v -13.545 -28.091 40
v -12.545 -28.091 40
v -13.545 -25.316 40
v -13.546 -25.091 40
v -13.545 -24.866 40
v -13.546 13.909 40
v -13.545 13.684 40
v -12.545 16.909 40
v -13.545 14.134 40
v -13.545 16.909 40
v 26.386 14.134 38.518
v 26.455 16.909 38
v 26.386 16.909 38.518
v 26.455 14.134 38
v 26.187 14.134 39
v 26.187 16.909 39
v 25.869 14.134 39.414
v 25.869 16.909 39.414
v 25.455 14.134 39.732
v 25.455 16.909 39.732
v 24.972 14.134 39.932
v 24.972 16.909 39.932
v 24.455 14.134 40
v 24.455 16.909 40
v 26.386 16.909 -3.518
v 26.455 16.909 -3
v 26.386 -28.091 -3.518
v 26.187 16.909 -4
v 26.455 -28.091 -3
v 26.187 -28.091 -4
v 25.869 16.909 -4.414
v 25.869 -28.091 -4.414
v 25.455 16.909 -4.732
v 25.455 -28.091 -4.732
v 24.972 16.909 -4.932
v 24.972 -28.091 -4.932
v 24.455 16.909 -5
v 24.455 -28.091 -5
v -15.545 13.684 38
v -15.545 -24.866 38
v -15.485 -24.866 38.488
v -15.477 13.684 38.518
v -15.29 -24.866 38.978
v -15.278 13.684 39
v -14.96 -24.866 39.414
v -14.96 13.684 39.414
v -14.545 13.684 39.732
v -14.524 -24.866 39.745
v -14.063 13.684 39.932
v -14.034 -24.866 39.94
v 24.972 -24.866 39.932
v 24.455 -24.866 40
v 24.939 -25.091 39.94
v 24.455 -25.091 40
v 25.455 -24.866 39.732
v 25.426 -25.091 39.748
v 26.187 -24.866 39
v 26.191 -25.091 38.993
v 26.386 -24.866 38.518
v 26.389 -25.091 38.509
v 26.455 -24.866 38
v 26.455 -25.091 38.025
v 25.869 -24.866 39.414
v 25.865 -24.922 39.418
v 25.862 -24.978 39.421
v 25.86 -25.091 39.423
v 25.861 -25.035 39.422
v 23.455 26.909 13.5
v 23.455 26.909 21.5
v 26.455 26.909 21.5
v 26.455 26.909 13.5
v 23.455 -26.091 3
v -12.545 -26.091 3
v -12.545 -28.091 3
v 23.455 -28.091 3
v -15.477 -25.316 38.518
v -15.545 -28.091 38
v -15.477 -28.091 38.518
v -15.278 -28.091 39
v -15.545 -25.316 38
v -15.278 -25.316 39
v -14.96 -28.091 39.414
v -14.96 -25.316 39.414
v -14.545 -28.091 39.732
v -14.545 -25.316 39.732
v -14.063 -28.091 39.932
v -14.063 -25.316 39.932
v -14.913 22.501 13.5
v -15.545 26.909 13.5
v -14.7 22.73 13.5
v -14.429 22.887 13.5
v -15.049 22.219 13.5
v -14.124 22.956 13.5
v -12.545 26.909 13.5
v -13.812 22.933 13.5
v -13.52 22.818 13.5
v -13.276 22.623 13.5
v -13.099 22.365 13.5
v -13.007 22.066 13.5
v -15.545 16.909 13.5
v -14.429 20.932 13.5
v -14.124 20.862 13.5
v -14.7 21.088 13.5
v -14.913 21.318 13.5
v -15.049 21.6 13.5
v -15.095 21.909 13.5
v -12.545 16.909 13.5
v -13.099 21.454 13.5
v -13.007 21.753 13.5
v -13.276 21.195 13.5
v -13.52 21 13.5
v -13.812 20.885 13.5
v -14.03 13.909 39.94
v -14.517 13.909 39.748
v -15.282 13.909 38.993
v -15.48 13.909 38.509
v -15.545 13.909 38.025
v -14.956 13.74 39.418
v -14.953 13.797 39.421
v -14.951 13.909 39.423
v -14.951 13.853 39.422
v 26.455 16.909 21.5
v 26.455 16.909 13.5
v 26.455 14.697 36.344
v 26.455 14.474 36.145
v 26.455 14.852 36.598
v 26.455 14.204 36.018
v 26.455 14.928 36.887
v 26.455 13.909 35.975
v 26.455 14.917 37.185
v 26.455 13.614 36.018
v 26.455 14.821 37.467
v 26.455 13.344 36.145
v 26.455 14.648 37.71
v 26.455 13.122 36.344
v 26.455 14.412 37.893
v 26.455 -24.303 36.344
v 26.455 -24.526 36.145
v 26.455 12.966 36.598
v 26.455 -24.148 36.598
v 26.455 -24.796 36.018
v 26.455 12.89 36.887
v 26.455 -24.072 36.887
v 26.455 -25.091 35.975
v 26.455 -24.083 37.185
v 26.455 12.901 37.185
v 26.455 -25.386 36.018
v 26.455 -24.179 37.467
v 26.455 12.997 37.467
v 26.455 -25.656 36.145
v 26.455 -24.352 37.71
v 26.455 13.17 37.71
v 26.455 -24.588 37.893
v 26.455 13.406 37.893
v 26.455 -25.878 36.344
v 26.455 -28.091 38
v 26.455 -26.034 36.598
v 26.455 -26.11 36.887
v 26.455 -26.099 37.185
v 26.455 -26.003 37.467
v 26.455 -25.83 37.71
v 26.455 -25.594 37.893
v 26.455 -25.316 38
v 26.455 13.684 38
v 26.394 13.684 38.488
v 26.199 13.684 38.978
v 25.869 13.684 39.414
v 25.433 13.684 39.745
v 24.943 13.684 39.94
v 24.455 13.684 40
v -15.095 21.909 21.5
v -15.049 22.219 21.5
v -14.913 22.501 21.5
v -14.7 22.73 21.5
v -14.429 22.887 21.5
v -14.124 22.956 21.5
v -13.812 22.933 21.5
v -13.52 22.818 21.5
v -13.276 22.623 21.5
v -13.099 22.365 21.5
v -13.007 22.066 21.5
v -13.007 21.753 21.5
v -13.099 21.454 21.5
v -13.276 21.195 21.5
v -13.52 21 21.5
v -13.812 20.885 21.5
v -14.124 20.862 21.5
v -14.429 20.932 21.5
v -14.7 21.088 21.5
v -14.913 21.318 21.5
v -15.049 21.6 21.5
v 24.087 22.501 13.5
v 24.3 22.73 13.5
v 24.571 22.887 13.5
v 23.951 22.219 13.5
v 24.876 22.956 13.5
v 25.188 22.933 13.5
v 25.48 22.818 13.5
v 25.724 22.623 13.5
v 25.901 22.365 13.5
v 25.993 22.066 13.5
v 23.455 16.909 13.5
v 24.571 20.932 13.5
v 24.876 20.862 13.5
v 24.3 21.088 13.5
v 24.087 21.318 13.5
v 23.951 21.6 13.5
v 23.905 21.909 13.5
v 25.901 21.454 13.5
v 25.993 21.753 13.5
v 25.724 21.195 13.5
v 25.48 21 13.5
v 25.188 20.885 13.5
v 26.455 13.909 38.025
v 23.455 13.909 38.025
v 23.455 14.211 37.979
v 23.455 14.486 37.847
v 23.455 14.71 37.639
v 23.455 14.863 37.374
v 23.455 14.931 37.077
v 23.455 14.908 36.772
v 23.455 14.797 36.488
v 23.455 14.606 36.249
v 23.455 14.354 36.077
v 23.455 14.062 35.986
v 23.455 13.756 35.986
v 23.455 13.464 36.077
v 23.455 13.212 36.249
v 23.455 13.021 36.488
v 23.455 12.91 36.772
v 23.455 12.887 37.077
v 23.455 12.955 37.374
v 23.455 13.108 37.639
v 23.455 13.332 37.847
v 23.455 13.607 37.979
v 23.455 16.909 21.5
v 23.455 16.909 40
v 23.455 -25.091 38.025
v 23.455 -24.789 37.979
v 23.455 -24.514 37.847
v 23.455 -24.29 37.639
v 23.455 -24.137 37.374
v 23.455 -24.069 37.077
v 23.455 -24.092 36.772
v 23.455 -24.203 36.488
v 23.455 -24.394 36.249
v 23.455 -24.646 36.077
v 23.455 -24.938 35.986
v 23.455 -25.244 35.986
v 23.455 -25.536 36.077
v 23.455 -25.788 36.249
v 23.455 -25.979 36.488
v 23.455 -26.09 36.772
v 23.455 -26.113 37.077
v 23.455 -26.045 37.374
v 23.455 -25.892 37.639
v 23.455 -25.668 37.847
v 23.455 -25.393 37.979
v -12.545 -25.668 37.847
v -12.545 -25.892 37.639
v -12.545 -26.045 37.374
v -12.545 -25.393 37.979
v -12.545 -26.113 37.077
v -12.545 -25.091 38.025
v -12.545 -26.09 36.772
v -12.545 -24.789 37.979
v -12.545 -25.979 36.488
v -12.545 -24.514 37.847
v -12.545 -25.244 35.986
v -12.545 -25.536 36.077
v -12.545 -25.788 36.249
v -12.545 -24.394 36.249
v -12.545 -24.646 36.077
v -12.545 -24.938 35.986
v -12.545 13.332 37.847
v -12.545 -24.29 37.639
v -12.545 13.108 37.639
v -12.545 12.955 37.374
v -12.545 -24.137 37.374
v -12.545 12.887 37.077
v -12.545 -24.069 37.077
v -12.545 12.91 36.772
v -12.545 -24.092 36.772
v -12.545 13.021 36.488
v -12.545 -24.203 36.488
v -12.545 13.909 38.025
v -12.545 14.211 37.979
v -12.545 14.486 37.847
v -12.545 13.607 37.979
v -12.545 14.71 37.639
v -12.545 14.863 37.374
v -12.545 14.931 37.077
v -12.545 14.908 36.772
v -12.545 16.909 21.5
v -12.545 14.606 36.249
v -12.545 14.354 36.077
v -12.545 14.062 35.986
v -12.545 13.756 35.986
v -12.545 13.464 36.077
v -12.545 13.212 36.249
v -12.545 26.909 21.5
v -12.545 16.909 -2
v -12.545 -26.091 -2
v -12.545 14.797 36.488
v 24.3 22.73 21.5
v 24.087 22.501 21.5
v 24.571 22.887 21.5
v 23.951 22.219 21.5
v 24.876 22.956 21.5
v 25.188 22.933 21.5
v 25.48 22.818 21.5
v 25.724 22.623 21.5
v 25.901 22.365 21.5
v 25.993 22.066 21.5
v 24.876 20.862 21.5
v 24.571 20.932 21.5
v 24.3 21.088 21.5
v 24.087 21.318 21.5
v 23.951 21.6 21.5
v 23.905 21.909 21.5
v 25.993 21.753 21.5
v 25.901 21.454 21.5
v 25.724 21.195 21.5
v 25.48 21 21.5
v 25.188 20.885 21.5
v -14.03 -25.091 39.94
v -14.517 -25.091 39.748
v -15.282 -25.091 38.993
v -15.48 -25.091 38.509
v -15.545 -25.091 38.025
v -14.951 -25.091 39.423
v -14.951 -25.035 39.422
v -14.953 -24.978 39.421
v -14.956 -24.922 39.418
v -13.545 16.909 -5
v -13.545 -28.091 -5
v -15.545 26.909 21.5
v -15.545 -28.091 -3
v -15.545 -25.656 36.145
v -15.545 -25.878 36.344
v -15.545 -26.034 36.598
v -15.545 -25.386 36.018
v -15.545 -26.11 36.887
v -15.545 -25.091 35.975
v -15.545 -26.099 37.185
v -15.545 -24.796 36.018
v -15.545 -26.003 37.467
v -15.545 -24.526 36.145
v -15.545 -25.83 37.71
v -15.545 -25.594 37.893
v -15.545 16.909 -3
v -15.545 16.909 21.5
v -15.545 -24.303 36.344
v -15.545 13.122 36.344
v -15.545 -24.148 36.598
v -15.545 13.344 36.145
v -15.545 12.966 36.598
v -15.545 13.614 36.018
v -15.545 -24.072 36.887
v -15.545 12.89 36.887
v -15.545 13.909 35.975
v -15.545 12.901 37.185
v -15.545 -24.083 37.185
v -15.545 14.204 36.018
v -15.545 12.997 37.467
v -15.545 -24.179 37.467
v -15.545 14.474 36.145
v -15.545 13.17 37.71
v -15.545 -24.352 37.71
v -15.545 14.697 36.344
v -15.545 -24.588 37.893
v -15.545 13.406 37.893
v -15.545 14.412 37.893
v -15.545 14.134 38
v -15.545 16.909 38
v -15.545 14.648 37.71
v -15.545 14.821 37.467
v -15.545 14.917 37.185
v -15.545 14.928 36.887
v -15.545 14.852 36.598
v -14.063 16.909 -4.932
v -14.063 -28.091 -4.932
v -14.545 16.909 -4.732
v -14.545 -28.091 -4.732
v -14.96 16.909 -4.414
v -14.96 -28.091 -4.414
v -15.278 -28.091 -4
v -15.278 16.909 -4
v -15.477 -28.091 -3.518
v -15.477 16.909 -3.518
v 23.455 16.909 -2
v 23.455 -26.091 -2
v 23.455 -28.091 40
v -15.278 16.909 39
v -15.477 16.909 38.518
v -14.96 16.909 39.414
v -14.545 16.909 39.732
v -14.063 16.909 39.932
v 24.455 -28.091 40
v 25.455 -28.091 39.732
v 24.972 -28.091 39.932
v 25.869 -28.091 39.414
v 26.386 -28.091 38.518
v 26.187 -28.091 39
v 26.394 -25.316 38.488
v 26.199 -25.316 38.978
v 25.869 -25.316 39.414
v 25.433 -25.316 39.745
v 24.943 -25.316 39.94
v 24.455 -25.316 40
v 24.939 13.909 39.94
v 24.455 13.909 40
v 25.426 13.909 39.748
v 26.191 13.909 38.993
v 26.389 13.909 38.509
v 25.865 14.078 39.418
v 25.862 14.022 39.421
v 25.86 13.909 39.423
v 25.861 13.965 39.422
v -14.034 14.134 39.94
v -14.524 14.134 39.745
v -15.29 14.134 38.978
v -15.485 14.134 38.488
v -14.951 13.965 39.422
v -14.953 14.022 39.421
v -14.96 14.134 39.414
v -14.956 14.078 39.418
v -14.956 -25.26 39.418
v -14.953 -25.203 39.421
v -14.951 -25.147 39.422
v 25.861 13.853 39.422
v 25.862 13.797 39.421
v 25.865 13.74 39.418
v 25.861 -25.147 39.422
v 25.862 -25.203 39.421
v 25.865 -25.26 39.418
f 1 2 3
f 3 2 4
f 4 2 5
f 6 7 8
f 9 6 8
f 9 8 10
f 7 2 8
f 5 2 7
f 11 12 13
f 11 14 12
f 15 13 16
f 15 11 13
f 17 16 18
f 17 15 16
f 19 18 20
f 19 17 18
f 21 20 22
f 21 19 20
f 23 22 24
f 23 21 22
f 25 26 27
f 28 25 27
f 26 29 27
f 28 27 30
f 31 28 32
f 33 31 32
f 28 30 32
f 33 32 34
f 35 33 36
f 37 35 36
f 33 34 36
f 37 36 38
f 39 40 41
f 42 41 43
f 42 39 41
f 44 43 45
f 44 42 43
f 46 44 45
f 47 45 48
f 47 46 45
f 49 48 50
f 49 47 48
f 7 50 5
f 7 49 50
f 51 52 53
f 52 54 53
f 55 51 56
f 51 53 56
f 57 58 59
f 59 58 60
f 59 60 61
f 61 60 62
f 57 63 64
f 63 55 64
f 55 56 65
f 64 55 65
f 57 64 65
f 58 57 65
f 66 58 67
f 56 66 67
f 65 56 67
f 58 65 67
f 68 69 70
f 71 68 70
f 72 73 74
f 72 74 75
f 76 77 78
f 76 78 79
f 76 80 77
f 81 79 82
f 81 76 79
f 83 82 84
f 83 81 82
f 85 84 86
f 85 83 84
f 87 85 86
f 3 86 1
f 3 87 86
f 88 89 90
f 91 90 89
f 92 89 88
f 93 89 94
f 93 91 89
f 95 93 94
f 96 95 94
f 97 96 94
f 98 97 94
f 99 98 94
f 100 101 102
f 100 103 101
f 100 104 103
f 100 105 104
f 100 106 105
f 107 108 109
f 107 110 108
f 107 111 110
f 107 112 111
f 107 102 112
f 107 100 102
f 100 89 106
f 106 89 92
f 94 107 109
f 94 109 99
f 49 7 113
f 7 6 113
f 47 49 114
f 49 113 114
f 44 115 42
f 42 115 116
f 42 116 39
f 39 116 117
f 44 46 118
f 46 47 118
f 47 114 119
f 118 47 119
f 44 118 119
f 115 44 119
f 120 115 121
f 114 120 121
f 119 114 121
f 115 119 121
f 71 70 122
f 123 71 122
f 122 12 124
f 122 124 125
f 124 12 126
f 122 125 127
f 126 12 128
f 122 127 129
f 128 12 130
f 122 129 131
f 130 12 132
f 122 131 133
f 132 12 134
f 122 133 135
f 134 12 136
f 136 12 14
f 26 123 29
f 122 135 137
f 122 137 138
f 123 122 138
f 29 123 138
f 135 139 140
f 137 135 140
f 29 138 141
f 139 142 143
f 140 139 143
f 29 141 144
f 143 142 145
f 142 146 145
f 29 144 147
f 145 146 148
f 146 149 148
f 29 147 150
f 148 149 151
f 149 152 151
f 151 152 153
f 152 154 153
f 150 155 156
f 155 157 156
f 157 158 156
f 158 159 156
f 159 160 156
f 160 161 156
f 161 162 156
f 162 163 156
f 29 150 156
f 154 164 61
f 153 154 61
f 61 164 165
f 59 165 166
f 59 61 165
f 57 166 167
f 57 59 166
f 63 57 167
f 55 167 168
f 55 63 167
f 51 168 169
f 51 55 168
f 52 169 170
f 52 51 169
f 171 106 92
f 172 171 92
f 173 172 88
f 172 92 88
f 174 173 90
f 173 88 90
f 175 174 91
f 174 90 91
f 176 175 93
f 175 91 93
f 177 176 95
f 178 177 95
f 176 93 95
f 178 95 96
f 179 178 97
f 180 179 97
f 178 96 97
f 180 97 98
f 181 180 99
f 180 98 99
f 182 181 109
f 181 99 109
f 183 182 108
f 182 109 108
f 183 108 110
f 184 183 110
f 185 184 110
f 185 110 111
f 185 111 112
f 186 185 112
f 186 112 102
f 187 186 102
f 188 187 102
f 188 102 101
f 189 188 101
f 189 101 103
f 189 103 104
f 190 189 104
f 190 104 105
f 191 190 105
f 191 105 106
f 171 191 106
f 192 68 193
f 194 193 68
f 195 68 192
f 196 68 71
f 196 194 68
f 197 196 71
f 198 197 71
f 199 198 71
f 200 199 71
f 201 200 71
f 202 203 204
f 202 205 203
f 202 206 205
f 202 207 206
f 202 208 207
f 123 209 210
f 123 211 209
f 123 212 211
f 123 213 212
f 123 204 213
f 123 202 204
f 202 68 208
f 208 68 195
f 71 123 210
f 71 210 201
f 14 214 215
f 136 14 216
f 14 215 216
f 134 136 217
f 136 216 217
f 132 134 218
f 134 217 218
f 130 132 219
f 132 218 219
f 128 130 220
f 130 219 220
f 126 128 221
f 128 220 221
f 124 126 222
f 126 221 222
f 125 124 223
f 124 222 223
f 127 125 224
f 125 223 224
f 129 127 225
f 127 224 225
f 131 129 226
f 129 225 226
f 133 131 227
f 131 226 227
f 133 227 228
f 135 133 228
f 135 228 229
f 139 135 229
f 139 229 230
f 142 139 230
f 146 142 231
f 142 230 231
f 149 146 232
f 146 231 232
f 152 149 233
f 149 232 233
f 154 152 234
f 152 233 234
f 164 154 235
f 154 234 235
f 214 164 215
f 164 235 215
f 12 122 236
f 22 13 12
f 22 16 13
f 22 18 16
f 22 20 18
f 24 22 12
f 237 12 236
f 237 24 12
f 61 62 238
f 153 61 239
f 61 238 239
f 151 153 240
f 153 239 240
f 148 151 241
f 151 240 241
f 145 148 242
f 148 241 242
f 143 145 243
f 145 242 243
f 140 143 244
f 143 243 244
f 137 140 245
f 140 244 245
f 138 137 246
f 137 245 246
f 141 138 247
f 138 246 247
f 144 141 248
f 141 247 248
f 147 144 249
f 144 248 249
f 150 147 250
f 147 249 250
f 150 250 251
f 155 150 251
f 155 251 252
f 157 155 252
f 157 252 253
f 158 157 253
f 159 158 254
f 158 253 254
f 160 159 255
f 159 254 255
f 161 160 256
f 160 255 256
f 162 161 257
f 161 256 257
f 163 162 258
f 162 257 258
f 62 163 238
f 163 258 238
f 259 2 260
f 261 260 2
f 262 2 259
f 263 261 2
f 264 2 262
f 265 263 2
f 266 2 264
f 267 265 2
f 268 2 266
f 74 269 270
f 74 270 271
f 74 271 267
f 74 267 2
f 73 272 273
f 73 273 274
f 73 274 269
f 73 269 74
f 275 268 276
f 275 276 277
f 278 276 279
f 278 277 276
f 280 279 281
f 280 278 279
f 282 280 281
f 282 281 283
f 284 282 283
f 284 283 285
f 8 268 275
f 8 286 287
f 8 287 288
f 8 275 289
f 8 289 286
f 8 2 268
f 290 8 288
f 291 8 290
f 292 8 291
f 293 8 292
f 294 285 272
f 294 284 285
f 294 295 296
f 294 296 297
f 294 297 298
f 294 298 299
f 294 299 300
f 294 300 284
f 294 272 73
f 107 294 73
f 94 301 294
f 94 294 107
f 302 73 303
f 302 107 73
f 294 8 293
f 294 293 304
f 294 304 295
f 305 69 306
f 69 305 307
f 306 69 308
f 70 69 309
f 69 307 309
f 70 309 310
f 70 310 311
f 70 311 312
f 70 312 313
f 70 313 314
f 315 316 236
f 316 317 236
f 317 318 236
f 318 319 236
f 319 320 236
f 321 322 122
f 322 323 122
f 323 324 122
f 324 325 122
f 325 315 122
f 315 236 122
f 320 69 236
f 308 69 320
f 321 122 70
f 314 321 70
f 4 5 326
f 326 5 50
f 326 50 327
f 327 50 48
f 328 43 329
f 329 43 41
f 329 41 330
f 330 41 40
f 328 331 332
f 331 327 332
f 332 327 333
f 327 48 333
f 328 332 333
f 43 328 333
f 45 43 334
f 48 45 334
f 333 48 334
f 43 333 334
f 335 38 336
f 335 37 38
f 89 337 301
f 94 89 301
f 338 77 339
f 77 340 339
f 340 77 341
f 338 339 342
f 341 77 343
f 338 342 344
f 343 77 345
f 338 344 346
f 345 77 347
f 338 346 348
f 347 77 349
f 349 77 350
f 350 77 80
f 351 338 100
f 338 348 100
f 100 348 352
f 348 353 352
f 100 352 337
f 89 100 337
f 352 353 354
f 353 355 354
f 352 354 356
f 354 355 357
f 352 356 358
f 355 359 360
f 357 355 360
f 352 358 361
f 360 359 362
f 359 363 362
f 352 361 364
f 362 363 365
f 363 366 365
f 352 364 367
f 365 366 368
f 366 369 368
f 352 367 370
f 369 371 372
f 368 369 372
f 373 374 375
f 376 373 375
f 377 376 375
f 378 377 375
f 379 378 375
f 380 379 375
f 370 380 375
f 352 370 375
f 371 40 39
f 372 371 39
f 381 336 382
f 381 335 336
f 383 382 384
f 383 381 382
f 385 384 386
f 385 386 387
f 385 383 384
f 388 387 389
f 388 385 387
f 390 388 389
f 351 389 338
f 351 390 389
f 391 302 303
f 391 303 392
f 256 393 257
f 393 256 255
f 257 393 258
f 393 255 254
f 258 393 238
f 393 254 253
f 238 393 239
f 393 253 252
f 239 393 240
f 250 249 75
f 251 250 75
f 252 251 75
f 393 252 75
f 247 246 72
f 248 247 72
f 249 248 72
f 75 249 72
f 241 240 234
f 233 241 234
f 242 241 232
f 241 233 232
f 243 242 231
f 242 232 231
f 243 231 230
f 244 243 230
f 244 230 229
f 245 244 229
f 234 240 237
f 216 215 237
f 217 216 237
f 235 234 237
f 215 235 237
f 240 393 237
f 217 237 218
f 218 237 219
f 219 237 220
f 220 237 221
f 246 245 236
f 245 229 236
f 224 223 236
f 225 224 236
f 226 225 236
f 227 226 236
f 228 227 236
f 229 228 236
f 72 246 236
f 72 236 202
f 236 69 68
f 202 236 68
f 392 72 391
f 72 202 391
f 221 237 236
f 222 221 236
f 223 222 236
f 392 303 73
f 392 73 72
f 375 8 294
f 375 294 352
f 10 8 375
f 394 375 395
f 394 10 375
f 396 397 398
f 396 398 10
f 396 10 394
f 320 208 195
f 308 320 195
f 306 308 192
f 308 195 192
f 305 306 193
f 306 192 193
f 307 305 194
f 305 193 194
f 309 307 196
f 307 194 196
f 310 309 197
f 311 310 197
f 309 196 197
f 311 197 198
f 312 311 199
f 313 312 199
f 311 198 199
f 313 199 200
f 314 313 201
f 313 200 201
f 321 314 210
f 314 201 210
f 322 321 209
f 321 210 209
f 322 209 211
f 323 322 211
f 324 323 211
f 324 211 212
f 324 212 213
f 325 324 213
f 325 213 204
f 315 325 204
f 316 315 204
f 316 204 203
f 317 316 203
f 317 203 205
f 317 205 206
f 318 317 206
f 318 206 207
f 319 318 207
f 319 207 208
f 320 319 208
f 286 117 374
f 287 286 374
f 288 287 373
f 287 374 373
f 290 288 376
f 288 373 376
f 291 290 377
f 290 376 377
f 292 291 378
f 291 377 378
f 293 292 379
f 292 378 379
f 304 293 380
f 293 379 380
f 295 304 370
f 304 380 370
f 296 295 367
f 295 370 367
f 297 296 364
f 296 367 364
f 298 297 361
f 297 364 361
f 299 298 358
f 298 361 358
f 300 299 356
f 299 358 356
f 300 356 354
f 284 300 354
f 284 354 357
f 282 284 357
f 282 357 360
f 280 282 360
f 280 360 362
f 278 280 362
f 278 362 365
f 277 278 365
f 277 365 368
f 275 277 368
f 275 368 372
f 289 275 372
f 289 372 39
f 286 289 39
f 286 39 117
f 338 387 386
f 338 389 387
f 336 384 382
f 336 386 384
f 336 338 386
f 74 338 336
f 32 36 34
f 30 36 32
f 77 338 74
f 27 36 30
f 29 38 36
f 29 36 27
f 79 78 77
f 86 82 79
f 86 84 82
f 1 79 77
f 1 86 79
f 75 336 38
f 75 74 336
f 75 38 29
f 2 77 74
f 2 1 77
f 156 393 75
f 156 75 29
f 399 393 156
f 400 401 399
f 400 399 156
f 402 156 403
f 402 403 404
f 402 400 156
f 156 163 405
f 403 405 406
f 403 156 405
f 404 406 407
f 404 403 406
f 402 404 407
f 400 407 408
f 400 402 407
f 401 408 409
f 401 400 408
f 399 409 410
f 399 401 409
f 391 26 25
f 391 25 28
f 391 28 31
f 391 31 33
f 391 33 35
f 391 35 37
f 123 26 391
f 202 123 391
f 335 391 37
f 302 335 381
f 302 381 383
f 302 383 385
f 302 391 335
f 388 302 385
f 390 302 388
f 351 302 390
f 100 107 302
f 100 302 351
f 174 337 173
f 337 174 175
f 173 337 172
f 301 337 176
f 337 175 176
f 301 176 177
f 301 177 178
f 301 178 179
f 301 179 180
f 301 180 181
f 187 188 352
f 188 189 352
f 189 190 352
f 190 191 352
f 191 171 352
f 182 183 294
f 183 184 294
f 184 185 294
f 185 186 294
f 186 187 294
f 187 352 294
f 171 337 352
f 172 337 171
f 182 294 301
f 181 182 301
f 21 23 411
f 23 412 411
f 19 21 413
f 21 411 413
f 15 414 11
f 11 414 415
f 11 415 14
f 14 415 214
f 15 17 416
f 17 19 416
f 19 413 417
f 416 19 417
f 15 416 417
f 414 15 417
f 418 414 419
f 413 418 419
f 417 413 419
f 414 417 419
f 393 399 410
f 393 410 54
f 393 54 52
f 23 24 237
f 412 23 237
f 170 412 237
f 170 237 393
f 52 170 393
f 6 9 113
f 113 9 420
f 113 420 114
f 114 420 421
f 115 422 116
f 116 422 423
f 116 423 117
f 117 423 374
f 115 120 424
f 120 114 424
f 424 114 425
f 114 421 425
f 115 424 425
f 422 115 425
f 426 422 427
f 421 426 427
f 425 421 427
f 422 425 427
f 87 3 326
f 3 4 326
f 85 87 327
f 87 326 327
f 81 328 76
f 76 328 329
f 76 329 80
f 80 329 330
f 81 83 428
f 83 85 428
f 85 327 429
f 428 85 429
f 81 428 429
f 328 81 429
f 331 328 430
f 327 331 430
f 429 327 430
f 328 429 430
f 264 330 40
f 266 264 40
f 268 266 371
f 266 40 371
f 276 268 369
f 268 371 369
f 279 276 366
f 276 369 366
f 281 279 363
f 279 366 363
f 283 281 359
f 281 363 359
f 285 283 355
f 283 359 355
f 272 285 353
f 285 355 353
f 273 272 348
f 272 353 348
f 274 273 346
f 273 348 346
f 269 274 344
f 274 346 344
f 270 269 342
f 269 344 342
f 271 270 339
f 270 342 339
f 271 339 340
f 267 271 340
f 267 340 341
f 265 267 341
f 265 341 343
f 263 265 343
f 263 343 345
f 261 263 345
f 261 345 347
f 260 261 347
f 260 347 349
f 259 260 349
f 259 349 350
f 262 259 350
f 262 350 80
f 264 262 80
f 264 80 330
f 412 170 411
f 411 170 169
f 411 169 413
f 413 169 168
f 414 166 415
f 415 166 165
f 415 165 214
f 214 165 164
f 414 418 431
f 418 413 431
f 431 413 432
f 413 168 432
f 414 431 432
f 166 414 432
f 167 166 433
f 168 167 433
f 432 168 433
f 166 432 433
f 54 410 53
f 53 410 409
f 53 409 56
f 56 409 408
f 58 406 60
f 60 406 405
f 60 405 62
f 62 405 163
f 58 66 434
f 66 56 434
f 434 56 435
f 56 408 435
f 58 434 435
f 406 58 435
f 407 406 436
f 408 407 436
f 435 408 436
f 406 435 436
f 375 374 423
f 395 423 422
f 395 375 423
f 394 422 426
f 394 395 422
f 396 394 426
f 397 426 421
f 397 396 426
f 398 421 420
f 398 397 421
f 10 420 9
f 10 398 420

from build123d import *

# Parameters (mm, degrees)
EXTRUDE_1_DEPTH      = 40
EXTRUDE_1_DEPTH_BACK = 5
SKETCH_2_W           = 36
SKETCH_2_H           = 37
CUT_EXTRUDE_1_DEPTH  = 50
SKETCH_5_W           = 36
SKETCH_5_H           = 5
CUT_EXTRUDE_4_DEPTH  = 43
SKETCH_9_R           = 1.025
CUT_EXTRUDE_5_DEPTH  = 45.5
SKETCH_10_W          = 3
SKETCH_10_H          = 8
EXTRUDE_4_DEPTH      = 10
SKETCH_12_R          = 1.05
CUT_EXTRUDE_6_DEPTH  = 10
FILLET_4_R           = 2
FILLET_5_R           = 2
FILLET_6_R           = 2
FILLET_7_R           = 2


with BuildPart() as part:
    # 草圖1 → 填料-伸長1 (new body, two sides)
    with BuildSketch(Plane.XY) as extrude_1_sk:
        Polygon((-14.545454545, -28.090909091), (-15.545454545, -28.090909091), (-15.545454545, 16.909090909), (-14.545454545, 16.909090909), (25.454545455, 16.909090909), (26.454545455, 16.909090909), (26.454545455, -28.090909091), (25.454545455, -28.090909091), align=None)
    extrude(amount=EXTRUDE_1_DEPTH)
    extrude(extrude_1_sk.sketch, amount=-EXTRUDE_1_DEPTH_BACK)

    # 草圖2 → 除料-伸長1 (cut)
    with BuildSketch(Plane(origin=(0, 16.909090909, 0), x_dir=(1, 0, 0), z_dir=(0, 1, 0))):
        with Locations((5.454545455, -21.5)):
            Rectangle(SKETCH_2_W, SKETCH_2_H)
    extrude(amount=-CUT_EXTRUDE_1_DEPTH, mode=Mode.SUBTRACT)

    # 草圖5 → 除料-伸長4 (cut)
    with BuildSketch(Plane(origin=(0, 16.909090909, 0), x_dir=(1, 0, 0), z_dir=(0, 1, 0))):
        with Locations((5.454545455, -0.5)):
            Rectangle(SKETCH_5_W, SKETCH_5_H)
    extrude(amount=-CUT_EXTRUDE_4_DEPTH, mode=Mode.SUBTRACT)

    # 草圖9 → 除料-伸長5 (cut)
    with BuildSketch(Plane.ZY.offset(15.545454545)):
        with Locations((37, -25.090909091)):
            Circle(SKETCH_9_R)
        with Locations((37, 13.909090909)):
            Circle(SKETCH_9_R)
    extrude(amount=-CUT_EXTRUDE_5_DEPTH, mode=Mode.SUBTRACT)

    # 草圖10 → 填料-伸長4 (add)
    with BuildSketch(Plane(origin=(0, 16.909090909, 0), x_dir=(1, 0, 0), z_dir=(0, 1, 0))):
        with Locations((-14.045454545, -17.5)):
            Rectangle(SKETCH_10_W, SKETCH_10_H)
        with Locations((24.954545455, -17.5)):
            Rectangle(SKETCH_10_W, SKETCH_10_H)
    extrude(amount=EXTRUDE_4_DEPTH)

    # 草圖12 → 除料-伸長6 (cut)
    with BuildSketch(Plane(origin=(0, 0, 13.5), x_dir=(-1, 0, 0), z_dir=(0, 0, -1))):
        with Locations((-24.954545455, 21.909090909)):
            Circle(SKETCH_12_R)
        with Locations((14.045454545, 21.909090909)):
            Circle(SKETCH_12_R)
    extrude(amount=-CUT_EXTRUDE_6_DEPTH, mode=Mode.SUBTRACT)

    # 圓角4
    fillet_4_edges = [part.edges().sort_by_distance(p)[0] for p in [
        (26.454545455, -5.590909091, -5),
    ]]
    fillet(fillet_4_edges, radius=FILLET_4_R)

    # 圓角5
    fillet_5_edges = [part.edges().sort_by_distance(p)[0] for p in [
        (-15.545454545, -5.590909091, -5),
    ]]
    fillet(fillet_5_edges, radius=FILLET_5_R)

    # 圓角6
    fillet_6_edges = [part.edges().sort_by_distance(p)[0] for p in [
        (26.454545455, -5.590909091, 40),
    ]]
    fillet(fillet_6_edges, radius=FILLET_6_R)

    # 圓角7
    fillet_7_edges = [part.edges().sort_by_distance(p)[0] for p in [
        (-15.545454545, -5.590909091, 40),
    ]]
    fillet(fillet_7_edges, radius=FILLET_7_R)


solid = part.part
